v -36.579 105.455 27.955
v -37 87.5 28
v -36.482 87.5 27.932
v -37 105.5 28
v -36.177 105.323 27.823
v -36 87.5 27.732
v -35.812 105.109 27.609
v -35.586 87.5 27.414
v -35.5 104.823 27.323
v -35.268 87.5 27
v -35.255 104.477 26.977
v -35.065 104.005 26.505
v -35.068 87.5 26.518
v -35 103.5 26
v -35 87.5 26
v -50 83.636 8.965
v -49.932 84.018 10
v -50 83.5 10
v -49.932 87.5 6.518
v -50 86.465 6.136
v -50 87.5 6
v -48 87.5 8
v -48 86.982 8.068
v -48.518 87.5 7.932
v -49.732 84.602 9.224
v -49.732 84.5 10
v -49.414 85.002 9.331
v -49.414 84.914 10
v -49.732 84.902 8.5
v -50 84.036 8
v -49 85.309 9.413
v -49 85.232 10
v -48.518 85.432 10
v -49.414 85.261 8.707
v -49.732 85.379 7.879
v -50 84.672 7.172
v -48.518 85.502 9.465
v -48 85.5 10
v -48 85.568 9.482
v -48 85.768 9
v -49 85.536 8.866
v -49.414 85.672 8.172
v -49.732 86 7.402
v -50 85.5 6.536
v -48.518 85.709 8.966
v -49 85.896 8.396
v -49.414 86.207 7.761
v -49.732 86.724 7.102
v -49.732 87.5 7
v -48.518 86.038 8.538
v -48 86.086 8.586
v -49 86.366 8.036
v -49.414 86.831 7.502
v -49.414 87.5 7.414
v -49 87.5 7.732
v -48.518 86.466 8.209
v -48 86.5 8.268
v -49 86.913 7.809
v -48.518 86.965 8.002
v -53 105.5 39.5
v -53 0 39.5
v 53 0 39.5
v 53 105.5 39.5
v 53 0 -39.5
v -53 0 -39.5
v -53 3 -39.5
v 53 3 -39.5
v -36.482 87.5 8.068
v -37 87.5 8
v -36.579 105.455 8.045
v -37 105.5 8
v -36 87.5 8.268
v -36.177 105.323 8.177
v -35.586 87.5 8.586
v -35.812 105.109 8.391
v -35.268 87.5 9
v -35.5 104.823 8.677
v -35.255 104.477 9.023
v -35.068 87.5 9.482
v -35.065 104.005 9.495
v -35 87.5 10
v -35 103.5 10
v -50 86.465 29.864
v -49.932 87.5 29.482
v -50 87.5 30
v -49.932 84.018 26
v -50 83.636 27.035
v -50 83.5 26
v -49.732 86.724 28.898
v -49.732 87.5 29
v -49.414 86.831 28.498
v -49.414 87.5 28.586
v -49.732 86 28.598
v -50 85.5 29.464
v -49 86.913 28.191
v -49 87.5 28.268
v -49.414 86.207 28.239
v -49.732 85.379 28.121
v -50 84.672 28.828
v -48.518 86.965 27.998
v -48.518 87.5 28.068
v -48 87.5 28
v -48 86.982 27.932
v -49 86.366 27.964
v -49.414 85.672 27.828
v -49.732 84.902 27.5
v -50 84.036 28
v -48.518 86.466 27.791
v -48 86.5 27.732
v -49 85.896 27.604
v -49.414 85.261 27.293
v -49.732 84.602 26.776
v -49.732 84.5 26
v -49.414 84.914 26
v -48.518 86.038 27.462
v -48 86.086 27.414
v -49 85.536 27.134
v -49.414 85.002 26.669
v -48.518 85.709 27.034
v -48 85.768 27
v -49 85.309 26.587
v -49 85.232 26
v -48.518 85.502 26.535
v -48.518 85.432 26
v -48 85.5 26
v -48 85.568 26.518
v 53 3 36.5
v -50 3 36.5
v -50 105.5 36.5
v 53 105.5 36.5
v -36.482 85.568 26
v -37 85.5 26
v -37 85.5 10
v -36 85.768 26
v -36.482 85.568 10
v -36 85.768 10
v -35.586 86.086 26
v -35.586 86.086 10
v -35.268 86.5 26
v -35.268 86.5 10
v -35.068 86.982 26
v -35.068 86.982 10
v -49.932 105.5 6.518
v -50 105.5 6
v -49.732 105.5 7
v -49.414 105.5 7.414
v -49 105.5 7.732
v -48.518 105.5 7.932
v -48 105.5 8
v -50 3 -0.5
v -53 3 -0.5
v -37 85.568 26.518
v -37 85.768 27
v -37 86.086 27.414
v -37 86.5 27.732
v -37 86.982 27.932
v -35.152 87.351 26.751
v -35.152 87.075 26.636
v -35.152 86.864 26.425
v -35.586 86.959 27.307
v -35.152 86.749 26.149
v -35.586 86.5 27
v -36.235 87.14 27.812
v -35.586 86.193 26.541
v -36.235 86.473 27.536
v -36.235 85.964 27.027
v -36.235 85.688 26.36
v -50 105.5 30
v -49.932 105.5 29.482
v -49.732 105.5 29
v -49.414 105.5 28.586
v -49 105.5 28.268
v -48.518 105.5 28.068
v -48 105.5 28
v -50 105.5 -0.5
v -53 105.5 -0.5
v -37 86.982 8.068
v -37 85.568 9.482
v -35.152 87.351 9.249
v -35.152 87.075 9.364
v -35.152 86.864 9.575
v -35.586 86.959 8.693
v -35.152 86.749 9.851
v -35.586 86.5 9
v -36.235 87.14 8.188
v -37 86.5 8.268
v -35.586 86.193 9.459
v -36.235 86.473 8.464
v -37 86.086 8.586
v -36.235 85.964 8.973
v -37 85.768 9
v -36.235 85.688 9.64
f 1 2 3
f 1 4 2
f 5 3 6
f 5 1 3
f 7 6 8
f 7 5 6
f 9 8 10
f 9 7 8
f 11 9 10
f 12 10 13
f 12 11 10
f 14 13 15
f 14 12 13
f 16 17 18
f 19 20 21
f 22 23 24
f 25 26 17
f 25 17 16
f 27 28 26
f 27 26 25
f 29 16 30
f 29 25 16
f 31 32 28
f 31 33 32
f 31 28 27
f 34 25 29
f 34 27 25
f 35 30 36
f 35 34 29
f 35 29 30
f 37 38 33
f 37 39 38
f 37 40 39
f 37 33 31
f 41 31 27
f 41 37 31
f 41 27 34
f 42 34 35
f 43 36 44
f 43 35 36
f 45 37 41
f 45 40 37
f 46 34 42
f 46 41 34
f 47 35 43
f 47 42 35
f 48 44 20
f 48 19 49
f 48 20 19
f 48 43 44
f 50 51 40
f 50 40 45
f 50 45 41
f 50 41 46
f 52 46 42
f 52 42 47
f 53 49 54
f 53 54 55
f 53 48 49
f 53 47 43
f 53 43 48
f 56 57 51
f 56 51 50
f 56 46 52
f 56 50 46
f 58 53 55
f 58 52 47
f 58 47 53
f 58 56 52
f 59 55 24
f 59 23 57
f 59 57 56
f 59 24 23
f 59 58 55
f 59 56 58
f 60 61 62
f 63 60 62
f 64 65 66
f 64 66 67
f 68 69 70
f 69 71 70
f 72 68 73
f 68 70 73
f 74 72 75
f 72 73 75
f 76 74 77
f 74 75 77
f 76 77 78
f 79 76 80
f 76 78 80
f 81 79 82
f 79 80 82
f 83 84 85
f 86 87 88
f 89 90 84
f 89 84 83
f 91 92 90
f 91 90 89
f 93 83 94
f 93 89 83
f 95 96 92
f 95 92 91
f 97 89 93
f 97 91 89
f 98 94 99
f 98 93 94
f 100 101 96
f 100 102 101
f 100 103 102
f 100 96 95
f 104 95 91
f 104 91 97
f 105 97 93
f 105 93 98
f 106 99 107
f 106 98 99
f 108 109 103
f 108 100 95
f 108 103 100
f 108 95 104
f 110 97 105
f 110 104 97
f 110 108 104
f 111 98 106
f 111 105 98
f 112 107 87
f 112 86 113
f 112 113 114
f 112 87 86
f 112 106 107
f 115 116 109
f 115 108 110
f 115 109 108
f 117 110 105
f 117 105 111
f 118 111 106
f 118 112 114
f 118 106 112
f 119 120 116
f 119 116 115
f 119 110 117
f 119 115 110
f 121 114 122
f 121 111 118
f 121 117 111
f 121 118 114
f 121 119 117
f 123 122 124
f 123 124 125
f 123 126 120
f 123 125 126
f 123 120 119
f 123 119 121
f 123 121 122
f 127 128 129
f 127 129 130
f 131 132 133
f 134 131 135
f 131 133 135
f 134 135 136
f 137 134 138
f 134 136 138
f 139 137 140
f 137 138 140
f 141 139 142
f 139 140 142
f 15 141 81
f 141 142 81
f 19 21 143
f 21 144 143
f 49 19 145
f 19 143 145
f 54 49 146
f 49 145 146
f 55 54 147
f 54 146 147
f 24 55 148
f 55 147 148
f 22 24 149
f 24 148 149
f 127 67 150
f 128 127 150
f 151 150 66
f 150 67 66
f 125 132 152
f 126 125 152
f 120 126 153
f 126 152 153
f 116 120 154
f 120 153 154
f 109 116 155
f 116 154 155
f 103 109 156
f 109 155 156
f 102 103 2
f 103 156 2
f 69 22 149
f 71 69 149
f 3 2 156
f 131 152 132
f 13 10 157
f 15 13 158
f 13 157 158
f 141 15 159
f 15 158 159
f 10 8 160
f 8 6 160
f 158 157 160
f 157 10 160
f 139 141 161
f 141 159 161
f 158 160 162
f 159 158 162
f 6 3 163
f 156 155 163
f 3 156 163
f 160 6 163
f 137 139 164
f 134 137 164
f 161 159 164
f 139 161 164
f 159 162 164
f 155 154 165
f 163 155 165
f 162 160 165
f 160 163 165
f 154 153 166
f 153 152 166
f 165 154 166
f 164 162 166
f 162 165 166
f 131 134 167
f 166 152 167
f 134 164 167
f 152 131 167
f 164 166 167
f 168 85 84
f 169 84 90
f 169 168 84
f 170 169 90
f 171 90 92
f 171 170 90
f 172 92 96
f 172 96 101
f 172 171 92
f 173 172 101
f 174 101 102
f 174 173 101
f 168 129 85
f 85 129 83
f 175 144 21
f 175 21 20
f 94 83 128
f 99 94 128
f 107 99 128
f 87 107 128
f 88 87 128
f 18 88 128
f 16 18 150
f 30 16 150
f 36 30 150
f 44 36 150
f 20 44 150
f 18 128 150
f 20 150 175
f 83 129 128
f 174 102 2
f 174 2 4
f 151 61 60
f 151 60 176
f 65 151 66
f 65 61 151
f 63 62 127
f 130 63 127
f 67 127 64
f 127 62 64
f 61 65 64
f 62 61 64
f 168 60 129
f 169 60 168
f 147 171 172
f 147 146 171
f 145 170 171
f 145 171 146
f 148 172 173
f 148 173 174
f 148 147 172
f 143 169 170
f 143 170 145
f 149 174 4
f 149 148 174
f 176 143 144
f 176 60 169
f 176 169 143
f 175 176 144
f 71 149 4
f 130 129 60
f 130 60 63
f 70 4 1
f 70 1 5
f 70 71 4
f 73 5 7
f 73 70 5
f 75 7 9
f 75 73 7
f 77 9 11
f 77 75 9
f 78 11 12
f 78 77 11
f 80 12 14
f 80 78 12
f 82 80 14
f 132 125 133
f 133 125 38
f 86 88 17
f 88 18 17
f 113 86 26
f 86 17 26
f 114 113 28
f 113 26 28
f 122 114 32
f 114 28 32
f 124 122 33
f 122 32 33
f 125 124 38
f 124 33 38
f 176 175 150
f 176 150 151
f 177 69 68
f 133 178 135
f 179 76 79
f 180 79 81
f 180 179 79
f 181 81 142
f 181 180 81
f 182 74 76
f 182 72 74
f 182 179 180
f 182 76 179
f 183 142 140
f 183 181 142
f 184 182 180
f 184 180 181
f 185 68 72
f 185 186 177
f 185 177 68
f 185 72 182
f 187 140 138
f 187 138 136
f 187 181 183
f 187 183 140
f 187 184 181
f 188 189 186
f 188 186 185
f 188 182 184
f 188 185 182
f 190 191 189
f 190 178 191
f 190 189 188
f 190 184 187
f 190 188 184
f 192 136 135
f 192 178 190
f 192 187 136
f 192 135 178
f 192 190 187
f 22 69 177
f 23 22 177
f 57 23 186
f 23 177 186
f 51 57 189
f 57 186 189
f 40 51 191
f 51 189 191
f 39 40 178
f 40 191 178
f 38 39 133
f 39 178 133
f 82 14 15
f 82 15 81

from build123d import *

# Parameters (mm, degrees)
SKETCH1_W                = 100
SKETCH1_H                = 73
BOSS_EXTRUDE1_DEPTH      = 3
BOSS_EXTRUDE2_DEPTH      = 102.5
BOSS_EXTRUDE2_DEPTH_BACK = 3
SKETCH2_W                = 106
SKETCH2_H                = 79
SKETCH2_W_2              = 100
SKETCH2_H_2              = 73
SKETCH3_W                = 106
SKETCH3_H                = 102.5
CUT_EXTRUDE1_DEPTH       = 39
CUT_EXTRUDE2_REACH       = 156.682
SKETCH4_W                = 37
SKETCH4_H                = 102.5
SKETCH5_W                = 20
SKETCH5_H                = 20
BOSS_EXTRUDE3_DEPTH      = 15
FILLET1_R                = 2


with BuildPart() as part:
    # Sketch1 → Boss-Extrude1 (new body)
    with BuildSketch(Plane(origin=(0, 0, 0), x_dir=(1, 0, 0), z_dir=(0, 1, 0))):
        Rectangle(SKETCH1_W, SKETCH1_H)
    extrude(amount=BOSS_EXTRUDE1_DEPTH)

    # Sketch2 → Boss-Extrude2 (add, two sides: drawn at the far end of the back side and taken through both)
    with BuildSketch(Plane(origin=(0, 3, 0), x_dir=(1, 0, 0), z_dir=(0, 1, 0)).offset(-BOSS_EXTRUDE2_DEPTH_BACK)):
        Rectangle(SKETCH2_W, SKETCH2_H)
        Rectangle(SKETCH2_W_2, SKETCH2_H_2, mode=Mode.SUBTRACT)
    extrude(amount=BOSS_EXTRUDE2_DEPTH + BOSS_EXTRUDE2_DEPTH_BACK)

    # Sketch3 → Cut-Extrude1 (cut)
    with BuildSketch(Plane(origin=(0, 0, -39.5), x_dir=(-1, 0, 0), z_dir=(0, 0, -1))):
        with Locations((0, 54.25)):
            Rectangle(SKETCH3_W, SKETCH3_H)
    extrude(amount=-CUT_EXTRUDE1_DEPTH, mode=Mode.SUBTRACT)

    # Sketch4 → Cut-Extrude2 (cut, up to next)
    with BuildSketch(Plane(origin=(53, 0, 0), x_dir=(0, 0, -1), z_dir=(1, 0, 0)), mode=Mode.PRIVATE) as cut_extrude2_sk1:
        with Locations((-18, 54.25)):
            Rectangle(SKETCH4_W, SKETCH4_H)
    cut_extrude2_tool1 = extrude(cut_extrude2_sk1.sketch, amount=-CUT_EXTRUDE2_REACH, mode=Mode.PRIVATE) & part.part
    add(cut_extrude2_tool1.solids().sort_by_distance((53, 54.25, 18))[0], mode=Mode.SUBTRACT)

    # Sketch5 → Boss-Extrude3 (add)
    with BuildSketch(Plane(origin=(-50, 0, 0), x_dir=(0, 0, -1), z_dir=(1, 0, 0))):
        with Locations((-18, 95.5)):
            Rectangle(SKETCH5_W, SKETCH5_H)
    extrude(amount=BOSS_EXTRUDE3_DEPTH)

    # Fillet1
    fillet1_edges = [part.edges().sort_by_distance(p)[0] for p in [
        (-50, 95.5, 8),
        (-42.5, 85.5, 8),
        (-50, 95.5, 28),
        (-50, 85.5, 18),
        (-42.5, 85.5, 28),
        (-35, 95.5, 8),
        (-35, 105.5, 18),
        (-35, 95.5, 28),
        (-35, 85.5, 18),
    ]]
    fillet(fillet1_edges, radius=FILLET1_R)


solid = part.part
